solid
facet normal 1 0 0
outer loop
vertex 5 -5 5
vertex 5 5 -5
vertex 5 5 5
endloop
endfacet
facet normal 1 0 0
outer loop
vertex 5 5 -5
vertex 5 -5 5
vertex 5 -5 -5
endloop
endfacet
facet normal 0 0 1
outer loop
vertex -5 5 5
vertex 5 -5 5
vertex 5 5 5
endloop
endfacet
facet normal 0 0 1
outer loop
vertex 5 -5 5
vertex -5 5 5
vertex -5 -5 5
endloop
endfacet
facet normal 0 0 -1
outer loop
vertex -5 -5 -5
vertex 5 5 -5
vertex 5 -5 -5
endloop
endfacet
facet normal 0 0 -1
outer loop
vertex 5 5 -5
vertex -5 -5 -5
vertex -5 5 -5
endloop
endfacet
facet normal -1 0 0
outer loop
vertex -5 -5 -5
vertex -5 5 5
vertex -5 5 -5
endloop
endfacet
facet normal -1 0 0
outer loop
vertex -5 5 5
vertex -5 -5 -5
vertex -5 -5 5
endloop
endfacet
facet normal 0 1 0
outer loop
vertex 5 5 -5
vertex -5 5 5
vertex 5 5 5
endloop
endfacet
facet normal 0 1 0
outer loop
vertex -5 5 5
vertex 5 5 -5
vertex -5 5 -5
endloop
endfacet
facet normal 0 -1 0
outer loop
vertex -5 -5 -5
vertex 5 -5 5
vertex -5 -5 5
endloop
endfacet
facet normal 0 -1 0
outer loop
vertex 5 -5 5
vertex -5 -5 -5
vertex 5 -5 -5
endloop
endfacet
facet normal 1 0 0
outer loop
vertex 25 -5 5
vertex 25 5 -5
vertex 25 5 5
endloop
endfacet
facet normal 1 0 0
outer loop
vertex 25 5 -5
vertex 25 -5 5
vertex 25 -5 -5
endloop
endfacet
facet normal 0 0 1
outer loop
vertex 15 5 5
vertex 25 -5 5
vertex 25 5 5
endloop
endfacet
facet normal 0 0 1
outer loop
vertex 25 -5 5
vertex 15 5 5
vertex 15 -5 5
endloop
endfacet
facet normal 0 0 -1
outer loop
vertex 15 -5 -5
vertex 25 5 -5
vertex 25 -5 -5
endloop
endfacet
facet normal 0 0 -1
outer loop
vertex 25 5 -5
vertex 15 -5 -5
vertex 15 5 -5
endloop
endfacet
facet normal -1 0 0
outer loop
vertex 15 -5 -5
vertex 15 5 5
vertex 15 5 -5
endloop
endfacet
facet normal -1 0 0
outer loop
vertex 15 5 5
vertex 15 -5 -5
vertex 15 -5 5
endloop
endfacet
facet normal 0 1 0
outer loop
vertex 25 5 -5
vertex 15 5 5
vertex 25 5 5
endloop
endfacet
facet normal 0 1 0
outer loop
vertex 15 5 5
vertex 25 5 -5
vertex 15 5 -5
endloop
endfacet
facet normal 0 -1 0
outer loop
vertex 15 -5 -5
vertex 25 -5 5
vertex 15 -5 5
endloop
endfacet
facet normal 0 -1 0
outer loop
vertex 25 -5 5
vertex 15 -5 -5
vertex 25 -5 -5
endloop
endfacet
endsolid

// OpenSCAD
translate_copy(vector=[20,0,0])cube(10,center=true);

module translate_copy(vector=[1,0,0]){
    children();
    translate(vector) children();
}
